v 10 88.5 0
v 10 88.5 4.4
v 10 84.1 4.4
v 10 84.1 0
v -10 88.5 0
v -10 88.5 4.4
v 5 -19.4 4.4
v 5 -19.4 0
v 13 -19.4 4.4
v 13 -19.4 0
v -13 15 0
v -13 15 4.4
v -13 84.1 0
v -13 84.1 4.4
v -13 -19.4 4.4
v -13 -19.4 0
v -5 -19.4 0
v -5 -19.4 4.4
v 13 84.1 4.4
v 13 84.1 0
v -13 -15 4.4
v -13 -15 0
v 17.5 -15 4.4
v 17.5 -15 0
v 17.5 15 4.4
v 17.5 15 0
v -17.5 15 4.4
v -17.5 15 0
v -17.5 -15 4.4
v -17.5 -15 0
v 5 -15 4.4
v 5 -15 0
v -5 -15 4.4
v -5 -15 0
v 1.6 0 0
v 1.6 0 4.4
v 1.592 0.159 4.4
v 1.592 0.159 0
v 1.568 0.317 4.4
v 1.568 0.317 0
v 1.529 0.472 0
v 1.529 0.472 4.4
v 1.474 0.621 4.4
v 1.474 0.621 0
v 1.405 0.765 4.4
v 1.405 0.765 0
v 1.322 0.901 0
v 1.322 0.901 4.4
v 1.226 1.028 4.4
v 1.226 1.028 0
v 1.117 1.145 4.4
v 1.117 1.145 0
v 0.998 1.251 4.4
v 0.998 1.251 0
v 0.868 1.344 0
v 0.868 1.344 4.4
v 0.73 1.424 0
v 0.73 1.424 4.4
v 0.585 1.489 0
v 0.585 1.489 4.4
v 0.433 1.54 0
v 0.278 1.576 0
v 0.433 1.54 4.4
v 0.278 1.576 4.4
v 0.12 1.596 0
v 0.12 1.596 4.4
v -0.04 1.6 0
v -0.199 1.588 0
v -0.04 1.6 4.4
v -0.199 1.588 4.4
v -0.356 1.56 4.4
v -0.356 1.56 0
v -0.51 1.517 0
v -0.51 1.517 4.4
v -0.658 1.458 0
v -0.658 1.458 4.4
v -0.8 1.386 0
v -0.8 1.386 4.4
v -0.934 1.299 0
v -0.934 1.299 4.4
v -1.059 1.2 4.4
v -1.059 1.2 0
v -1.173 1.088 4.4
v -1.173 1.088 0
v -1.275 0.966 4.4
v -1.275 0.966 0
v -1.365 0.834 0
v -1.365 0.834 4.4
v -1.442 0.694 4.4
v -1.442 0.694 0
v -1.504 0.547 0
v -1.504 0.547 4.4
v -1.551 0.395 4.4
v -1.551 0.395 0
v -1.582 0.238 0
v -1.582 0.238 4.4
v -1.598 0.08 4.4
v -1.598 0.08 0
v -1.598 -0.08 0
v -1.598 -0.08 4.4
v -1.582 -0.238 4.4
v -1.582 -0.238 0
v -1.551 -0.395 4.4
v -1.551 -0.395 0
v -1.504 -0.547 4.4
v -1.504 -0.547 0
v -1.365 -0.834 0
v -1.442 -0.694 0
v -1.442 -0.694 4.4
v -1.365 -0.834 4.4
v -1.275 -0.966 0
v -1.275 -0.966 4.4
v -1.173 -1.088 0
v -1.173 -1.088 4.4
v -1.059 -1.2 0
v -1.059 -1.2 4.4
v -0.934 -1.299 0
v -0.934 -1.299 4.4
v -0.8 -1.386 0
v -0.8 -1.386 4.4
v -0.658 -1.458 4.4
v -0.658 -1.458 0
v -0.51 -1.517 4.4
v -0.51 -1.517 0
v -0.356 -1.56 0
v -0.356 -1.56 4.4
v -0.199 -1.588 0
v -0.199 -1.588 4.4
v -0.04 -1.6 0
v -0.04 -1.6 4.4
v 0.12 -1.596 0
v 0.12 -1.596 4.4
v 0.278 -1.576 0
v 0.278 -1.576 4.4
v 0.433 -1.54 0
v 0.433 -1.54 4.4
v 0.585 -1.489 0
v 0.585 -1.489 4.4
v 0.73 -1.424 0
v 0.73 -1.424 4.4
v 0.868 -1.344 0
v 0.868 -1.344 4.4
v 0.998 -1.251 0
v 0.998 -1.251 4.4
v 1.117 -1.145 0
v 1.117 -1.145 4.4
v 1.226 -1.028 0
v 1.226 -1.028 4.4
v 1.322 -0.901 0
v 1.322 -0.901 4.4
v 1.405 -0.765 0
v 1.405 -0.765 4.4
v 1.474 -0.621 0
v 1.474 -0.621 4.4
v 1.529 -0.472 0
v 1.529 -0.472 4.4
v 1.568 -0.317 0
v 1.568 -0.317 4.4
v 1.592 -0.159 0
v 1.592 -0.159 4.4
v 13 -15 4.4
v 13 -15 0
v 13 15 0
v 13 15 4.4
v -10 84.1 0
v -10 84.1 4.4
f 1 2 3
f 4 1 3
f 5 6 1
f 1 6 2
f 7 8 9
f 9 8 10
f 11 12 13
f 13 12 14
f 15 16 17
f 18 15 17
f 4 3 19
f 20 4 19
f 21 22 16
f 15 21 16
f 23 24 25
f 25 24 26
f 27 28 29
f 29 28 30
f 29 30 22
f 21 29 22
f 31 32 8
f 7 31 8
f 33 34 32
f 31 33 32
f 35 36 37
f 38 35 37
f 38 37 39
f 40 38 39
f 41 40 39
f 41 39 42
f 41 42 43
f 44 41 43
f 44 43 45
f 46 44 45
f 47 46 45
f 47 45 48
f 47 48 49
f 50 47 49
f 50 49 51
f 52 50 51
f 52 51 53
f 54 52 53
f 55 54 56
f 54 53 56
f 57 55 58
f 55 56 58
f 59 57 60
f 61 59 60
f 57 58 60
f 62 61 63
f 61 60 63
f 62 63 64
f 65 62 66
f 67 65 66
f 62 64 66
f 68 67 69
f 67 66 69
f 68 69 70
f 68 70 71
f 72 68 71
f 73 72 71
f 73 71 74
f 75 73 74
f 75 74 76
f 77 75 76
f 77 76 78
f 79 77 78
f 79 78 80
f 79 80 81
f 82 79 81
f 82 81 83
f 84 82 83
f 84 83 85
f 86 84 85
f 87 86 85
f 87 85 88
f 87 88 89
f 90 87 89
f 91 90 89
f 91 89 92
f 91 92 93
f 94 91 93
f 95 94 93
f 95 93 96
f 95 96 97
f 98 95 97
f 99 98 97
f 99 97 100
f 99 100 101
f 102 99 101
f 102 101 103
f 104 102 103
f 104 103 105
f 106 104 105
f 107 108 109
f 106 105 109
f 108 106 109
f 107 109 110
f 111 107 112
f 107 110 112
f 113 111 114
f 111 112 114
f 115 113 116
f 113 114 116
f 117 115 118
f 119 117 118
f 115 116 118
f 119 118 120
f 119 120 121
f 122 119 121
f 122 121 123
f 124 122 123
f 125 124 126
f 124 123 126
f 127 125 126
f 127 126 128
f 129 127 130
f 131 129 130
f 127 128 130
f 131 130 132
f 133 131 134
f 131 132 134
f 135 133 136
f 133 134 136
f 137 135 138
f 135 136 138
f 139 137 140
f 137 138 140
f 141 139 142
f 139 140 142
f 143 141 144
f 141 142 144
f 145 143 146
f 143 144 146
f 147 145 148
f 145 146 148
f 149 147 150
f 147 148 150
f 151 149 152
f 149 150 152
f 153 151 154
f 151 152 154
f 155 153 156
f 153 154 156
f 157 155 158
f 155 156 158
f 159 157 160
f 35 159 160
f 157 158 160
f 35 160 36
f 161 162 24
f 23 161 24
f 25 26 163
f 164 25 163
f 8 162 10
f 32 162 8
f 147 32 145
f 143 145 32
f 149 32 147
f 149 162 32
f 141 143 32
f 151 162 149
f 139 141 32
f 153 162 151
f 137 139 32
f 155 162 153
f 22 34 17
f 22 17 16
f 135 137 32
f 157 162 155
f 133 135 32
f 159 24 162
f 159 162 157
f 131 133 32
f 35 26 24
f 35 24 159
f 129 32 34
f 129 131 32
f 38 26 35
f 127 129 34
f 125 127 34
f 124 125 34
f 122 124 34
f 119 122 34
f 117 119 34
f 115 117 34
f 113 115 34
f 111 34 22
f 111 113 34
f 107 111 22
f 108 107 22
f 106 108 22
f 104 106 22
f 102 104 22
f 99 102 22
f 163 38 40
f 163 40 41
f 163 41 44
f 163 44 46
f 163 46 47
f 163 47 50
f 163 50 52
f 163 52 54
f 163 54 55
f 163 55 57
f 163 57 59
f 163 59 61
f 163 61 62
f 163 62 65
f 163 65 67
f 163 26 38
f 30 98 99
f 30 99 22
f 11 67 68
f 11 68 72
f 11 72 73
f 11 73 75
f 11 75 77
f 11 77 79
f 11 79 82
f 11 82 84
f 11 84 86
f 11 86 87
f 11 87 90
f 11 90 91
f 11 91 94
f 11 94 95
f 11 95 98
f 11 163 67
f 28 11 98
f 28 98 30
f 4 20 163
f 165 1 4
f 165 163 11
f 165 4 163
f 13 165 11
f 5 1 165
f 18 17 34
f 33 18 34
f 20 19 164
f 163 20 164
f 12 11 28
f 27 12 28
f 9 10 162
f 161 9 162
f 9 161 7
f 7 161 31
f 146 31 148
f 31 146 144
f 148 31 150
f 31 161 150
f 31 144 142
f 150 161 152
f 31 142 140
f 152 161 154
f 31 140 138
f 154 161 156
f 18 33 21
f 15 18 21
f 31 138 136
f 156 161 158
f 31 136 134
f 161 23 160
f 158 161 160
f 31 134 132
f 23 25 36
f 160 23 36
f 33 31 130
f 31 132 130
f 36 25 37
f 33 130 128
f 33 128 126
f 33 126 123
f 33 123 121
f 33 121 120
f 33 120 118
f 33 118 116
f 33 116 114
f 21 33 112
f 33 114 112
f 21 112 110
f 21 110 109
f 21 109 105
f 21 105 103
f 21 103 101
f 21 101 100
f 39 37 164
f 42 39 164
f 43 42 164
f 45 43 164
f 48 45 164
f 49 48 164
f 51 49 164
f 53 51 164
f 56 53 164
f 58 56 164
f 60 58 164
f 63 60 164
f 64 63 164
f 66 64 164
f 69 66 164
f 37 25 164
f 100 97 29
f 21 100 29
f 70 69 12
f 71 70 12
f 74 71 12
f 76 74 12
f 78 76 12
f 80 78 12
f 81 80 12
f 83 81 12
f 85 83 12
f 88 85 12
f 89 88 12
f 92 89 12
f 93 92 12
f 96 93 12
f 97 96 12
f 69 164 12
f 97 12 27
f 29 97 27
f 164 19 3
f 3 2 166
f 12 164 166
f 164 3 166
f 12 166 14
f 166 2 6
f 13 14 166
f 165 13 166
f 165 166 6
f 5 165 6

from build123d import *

# Parameters (mm, degrees)
EXTRUDE_1_DEPTH     = 4.4
SKETCH_2_R          = 1.6
CUT_EXTRUDE_1_DEPTH = 10
EXTRUDE_2_DEPTH     = 4.4


with BuildPart() as part:
    # 草图1 → 凸台-拉伸1 (new body)
    with BuildSketch(Plane.XY):
        Polygon((5, 19.4), (5, 15), (-5, 15), (-5, 19.4), (-13, 19.4), (-13, 15), (-17.5, 15), (-17.5, -15), (-13, -15), (-13, -19.4), (-5, -19.4), (-5, -15), (5, -15), (5, -19.4), (13, -19.4), (13, -15), (17.5, -15), (17.5, 15), (13, 15), (13, 19.4), align=None)
    extrude(amount=EXTRUDE_1_DEPTH)

    # 草图2 → 切除-拉伸1 (cut)
    with BuildSketch(Plane.XY.offset(4.4)):
        Circle(SKETCH_2_R)
    extrude(amount=-CUT_EXTRUDE_1_DEPTH, mode=Mode.SUBTRACT)

    # 草图3 → 凸台-拉伸2 (add)
    with BuildSketch(Plane.XY.offset(4.4)):
        Polygon((10, 88.5), (10, 84.1), (13, 84.1), (13, 15), (-13, 15), (-13, 84.1), (-10, 84.1), (-10, 88.5), align=None)
    extrude(amount=-EXTRUDE_2_DEPTH)


solid = part.part
